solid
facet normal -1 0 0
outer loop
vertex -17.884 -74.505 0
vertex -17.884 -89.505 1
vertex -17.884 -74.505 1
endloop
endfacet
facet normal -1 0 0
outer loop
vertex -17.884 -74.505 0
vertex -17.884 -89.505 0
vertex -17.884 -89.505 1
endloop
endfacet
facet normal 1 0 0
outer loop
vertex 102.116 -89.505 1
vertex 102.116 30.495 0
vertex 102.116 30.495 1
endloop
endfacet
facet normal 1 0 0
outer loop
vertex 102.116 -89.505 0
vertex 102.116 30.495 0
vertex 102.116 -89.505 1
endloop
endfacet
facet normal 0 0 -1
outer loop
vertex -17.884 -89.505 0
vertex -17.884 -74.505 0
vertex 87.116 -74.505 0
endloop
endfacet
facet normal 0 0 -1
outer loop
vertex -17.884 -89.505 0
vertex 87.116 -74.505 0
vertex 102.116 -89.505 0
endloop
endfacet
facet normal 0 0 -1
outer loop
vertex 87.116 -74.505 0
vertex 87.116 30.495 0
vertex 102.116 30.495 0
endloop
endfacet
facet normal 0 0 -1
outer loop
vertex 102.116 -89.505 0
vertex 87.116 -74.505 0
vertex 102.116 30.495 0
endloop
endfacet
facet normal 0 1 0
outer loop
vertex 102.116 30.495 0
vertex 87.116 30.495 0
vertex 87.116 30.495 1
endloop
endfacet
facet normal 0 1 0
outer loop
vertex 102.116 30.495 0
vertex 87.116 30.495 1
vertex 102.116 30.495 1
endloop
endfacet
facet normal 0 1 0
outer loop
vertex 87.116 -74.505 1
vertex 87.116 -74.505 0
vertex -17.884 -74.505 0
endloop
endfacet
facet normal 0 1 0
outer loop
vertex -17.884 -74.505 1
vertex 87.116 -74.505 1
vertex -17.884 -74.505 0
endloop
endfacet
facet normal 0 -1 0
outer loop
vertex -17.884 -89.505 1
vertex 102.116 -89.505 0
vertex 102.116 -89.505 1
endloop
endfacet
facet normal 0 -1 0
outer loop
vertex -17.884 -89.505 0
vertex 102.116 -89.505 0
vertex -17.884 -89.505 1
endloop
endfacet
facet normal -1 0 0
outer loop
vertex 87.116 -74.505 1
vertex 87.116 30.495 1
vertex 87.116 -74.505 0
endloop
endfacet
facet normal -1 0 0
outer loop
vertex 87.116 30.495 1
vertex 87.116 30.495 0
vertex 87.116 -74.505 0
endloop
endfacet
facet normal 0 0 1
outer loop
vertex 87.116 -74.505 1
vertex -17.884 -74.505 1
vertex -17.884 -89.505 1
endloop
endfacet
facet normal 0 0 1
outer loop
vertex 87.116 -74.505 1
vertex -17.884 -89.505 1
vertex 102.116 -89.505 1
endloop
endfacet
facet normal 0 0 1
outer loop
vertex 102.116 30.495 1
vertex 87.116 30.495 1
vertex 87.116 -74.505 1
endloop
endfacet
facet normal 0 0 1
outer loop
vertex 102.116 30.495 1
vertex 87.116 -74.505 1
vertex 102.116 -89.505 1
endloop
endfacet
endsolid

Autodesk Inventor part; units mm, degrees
ref_plane "YZ Plane" through (0, 0, 0) normal (1, 0, 0) x (0, 1, 0)
ref_plane "XZ Plane" through (0, 0, 0) normal (0, 1, 0) x (-1, 0, 0)
ref_plane "XY Plane" through (0, 0, 0) normal (0, 0, 1) x (1, 0, 0)
sketch "Sketch1" plane through (0, 0, 0) normal (0, 0, 1) x (1, 0, 0)
  line L0 (-17.8842, 30.4949) -> (102.1158, 30.4949)
  line L1 (102.1158, 30.4949) -> (102.1158, -89.5051)
  line L2 (102.1158, -89.5051) -> (-17.8842, -89.5051)
  line L3 (-17.8842, -89.5051) -> (-17.8842, 30.4949)
  line L4 (-17.8842, 30.4949) -> (87.1158, 30.4949)
  line L5 (87.1158, 30.4949) -> (87.1158, -74.5051)
  line L6 (87.1158, -74.5051) -> (-17.8842, -74.5051)
  line L7 (-17.8842, -74.5051) -> (-17.8842, 30.4949)
  point P0 (0, 0)
  point P1 (87.1158, 30.4949)
  point P2 (-17.8842, -74.5051)
  dimension "d0" = 120
  dimension "d1" = 120
  dimension "d2" = 105
  dimension "d3" = 105
extrude "Extrusion1" add sketch "Sketch1" along normal blind 1 contours L0 L1 L2 L3 L6 L5
properties part number "8006_Cu_groundplane_Tx_Filter_Stage2_MPSv2_v1" material "Copper"
